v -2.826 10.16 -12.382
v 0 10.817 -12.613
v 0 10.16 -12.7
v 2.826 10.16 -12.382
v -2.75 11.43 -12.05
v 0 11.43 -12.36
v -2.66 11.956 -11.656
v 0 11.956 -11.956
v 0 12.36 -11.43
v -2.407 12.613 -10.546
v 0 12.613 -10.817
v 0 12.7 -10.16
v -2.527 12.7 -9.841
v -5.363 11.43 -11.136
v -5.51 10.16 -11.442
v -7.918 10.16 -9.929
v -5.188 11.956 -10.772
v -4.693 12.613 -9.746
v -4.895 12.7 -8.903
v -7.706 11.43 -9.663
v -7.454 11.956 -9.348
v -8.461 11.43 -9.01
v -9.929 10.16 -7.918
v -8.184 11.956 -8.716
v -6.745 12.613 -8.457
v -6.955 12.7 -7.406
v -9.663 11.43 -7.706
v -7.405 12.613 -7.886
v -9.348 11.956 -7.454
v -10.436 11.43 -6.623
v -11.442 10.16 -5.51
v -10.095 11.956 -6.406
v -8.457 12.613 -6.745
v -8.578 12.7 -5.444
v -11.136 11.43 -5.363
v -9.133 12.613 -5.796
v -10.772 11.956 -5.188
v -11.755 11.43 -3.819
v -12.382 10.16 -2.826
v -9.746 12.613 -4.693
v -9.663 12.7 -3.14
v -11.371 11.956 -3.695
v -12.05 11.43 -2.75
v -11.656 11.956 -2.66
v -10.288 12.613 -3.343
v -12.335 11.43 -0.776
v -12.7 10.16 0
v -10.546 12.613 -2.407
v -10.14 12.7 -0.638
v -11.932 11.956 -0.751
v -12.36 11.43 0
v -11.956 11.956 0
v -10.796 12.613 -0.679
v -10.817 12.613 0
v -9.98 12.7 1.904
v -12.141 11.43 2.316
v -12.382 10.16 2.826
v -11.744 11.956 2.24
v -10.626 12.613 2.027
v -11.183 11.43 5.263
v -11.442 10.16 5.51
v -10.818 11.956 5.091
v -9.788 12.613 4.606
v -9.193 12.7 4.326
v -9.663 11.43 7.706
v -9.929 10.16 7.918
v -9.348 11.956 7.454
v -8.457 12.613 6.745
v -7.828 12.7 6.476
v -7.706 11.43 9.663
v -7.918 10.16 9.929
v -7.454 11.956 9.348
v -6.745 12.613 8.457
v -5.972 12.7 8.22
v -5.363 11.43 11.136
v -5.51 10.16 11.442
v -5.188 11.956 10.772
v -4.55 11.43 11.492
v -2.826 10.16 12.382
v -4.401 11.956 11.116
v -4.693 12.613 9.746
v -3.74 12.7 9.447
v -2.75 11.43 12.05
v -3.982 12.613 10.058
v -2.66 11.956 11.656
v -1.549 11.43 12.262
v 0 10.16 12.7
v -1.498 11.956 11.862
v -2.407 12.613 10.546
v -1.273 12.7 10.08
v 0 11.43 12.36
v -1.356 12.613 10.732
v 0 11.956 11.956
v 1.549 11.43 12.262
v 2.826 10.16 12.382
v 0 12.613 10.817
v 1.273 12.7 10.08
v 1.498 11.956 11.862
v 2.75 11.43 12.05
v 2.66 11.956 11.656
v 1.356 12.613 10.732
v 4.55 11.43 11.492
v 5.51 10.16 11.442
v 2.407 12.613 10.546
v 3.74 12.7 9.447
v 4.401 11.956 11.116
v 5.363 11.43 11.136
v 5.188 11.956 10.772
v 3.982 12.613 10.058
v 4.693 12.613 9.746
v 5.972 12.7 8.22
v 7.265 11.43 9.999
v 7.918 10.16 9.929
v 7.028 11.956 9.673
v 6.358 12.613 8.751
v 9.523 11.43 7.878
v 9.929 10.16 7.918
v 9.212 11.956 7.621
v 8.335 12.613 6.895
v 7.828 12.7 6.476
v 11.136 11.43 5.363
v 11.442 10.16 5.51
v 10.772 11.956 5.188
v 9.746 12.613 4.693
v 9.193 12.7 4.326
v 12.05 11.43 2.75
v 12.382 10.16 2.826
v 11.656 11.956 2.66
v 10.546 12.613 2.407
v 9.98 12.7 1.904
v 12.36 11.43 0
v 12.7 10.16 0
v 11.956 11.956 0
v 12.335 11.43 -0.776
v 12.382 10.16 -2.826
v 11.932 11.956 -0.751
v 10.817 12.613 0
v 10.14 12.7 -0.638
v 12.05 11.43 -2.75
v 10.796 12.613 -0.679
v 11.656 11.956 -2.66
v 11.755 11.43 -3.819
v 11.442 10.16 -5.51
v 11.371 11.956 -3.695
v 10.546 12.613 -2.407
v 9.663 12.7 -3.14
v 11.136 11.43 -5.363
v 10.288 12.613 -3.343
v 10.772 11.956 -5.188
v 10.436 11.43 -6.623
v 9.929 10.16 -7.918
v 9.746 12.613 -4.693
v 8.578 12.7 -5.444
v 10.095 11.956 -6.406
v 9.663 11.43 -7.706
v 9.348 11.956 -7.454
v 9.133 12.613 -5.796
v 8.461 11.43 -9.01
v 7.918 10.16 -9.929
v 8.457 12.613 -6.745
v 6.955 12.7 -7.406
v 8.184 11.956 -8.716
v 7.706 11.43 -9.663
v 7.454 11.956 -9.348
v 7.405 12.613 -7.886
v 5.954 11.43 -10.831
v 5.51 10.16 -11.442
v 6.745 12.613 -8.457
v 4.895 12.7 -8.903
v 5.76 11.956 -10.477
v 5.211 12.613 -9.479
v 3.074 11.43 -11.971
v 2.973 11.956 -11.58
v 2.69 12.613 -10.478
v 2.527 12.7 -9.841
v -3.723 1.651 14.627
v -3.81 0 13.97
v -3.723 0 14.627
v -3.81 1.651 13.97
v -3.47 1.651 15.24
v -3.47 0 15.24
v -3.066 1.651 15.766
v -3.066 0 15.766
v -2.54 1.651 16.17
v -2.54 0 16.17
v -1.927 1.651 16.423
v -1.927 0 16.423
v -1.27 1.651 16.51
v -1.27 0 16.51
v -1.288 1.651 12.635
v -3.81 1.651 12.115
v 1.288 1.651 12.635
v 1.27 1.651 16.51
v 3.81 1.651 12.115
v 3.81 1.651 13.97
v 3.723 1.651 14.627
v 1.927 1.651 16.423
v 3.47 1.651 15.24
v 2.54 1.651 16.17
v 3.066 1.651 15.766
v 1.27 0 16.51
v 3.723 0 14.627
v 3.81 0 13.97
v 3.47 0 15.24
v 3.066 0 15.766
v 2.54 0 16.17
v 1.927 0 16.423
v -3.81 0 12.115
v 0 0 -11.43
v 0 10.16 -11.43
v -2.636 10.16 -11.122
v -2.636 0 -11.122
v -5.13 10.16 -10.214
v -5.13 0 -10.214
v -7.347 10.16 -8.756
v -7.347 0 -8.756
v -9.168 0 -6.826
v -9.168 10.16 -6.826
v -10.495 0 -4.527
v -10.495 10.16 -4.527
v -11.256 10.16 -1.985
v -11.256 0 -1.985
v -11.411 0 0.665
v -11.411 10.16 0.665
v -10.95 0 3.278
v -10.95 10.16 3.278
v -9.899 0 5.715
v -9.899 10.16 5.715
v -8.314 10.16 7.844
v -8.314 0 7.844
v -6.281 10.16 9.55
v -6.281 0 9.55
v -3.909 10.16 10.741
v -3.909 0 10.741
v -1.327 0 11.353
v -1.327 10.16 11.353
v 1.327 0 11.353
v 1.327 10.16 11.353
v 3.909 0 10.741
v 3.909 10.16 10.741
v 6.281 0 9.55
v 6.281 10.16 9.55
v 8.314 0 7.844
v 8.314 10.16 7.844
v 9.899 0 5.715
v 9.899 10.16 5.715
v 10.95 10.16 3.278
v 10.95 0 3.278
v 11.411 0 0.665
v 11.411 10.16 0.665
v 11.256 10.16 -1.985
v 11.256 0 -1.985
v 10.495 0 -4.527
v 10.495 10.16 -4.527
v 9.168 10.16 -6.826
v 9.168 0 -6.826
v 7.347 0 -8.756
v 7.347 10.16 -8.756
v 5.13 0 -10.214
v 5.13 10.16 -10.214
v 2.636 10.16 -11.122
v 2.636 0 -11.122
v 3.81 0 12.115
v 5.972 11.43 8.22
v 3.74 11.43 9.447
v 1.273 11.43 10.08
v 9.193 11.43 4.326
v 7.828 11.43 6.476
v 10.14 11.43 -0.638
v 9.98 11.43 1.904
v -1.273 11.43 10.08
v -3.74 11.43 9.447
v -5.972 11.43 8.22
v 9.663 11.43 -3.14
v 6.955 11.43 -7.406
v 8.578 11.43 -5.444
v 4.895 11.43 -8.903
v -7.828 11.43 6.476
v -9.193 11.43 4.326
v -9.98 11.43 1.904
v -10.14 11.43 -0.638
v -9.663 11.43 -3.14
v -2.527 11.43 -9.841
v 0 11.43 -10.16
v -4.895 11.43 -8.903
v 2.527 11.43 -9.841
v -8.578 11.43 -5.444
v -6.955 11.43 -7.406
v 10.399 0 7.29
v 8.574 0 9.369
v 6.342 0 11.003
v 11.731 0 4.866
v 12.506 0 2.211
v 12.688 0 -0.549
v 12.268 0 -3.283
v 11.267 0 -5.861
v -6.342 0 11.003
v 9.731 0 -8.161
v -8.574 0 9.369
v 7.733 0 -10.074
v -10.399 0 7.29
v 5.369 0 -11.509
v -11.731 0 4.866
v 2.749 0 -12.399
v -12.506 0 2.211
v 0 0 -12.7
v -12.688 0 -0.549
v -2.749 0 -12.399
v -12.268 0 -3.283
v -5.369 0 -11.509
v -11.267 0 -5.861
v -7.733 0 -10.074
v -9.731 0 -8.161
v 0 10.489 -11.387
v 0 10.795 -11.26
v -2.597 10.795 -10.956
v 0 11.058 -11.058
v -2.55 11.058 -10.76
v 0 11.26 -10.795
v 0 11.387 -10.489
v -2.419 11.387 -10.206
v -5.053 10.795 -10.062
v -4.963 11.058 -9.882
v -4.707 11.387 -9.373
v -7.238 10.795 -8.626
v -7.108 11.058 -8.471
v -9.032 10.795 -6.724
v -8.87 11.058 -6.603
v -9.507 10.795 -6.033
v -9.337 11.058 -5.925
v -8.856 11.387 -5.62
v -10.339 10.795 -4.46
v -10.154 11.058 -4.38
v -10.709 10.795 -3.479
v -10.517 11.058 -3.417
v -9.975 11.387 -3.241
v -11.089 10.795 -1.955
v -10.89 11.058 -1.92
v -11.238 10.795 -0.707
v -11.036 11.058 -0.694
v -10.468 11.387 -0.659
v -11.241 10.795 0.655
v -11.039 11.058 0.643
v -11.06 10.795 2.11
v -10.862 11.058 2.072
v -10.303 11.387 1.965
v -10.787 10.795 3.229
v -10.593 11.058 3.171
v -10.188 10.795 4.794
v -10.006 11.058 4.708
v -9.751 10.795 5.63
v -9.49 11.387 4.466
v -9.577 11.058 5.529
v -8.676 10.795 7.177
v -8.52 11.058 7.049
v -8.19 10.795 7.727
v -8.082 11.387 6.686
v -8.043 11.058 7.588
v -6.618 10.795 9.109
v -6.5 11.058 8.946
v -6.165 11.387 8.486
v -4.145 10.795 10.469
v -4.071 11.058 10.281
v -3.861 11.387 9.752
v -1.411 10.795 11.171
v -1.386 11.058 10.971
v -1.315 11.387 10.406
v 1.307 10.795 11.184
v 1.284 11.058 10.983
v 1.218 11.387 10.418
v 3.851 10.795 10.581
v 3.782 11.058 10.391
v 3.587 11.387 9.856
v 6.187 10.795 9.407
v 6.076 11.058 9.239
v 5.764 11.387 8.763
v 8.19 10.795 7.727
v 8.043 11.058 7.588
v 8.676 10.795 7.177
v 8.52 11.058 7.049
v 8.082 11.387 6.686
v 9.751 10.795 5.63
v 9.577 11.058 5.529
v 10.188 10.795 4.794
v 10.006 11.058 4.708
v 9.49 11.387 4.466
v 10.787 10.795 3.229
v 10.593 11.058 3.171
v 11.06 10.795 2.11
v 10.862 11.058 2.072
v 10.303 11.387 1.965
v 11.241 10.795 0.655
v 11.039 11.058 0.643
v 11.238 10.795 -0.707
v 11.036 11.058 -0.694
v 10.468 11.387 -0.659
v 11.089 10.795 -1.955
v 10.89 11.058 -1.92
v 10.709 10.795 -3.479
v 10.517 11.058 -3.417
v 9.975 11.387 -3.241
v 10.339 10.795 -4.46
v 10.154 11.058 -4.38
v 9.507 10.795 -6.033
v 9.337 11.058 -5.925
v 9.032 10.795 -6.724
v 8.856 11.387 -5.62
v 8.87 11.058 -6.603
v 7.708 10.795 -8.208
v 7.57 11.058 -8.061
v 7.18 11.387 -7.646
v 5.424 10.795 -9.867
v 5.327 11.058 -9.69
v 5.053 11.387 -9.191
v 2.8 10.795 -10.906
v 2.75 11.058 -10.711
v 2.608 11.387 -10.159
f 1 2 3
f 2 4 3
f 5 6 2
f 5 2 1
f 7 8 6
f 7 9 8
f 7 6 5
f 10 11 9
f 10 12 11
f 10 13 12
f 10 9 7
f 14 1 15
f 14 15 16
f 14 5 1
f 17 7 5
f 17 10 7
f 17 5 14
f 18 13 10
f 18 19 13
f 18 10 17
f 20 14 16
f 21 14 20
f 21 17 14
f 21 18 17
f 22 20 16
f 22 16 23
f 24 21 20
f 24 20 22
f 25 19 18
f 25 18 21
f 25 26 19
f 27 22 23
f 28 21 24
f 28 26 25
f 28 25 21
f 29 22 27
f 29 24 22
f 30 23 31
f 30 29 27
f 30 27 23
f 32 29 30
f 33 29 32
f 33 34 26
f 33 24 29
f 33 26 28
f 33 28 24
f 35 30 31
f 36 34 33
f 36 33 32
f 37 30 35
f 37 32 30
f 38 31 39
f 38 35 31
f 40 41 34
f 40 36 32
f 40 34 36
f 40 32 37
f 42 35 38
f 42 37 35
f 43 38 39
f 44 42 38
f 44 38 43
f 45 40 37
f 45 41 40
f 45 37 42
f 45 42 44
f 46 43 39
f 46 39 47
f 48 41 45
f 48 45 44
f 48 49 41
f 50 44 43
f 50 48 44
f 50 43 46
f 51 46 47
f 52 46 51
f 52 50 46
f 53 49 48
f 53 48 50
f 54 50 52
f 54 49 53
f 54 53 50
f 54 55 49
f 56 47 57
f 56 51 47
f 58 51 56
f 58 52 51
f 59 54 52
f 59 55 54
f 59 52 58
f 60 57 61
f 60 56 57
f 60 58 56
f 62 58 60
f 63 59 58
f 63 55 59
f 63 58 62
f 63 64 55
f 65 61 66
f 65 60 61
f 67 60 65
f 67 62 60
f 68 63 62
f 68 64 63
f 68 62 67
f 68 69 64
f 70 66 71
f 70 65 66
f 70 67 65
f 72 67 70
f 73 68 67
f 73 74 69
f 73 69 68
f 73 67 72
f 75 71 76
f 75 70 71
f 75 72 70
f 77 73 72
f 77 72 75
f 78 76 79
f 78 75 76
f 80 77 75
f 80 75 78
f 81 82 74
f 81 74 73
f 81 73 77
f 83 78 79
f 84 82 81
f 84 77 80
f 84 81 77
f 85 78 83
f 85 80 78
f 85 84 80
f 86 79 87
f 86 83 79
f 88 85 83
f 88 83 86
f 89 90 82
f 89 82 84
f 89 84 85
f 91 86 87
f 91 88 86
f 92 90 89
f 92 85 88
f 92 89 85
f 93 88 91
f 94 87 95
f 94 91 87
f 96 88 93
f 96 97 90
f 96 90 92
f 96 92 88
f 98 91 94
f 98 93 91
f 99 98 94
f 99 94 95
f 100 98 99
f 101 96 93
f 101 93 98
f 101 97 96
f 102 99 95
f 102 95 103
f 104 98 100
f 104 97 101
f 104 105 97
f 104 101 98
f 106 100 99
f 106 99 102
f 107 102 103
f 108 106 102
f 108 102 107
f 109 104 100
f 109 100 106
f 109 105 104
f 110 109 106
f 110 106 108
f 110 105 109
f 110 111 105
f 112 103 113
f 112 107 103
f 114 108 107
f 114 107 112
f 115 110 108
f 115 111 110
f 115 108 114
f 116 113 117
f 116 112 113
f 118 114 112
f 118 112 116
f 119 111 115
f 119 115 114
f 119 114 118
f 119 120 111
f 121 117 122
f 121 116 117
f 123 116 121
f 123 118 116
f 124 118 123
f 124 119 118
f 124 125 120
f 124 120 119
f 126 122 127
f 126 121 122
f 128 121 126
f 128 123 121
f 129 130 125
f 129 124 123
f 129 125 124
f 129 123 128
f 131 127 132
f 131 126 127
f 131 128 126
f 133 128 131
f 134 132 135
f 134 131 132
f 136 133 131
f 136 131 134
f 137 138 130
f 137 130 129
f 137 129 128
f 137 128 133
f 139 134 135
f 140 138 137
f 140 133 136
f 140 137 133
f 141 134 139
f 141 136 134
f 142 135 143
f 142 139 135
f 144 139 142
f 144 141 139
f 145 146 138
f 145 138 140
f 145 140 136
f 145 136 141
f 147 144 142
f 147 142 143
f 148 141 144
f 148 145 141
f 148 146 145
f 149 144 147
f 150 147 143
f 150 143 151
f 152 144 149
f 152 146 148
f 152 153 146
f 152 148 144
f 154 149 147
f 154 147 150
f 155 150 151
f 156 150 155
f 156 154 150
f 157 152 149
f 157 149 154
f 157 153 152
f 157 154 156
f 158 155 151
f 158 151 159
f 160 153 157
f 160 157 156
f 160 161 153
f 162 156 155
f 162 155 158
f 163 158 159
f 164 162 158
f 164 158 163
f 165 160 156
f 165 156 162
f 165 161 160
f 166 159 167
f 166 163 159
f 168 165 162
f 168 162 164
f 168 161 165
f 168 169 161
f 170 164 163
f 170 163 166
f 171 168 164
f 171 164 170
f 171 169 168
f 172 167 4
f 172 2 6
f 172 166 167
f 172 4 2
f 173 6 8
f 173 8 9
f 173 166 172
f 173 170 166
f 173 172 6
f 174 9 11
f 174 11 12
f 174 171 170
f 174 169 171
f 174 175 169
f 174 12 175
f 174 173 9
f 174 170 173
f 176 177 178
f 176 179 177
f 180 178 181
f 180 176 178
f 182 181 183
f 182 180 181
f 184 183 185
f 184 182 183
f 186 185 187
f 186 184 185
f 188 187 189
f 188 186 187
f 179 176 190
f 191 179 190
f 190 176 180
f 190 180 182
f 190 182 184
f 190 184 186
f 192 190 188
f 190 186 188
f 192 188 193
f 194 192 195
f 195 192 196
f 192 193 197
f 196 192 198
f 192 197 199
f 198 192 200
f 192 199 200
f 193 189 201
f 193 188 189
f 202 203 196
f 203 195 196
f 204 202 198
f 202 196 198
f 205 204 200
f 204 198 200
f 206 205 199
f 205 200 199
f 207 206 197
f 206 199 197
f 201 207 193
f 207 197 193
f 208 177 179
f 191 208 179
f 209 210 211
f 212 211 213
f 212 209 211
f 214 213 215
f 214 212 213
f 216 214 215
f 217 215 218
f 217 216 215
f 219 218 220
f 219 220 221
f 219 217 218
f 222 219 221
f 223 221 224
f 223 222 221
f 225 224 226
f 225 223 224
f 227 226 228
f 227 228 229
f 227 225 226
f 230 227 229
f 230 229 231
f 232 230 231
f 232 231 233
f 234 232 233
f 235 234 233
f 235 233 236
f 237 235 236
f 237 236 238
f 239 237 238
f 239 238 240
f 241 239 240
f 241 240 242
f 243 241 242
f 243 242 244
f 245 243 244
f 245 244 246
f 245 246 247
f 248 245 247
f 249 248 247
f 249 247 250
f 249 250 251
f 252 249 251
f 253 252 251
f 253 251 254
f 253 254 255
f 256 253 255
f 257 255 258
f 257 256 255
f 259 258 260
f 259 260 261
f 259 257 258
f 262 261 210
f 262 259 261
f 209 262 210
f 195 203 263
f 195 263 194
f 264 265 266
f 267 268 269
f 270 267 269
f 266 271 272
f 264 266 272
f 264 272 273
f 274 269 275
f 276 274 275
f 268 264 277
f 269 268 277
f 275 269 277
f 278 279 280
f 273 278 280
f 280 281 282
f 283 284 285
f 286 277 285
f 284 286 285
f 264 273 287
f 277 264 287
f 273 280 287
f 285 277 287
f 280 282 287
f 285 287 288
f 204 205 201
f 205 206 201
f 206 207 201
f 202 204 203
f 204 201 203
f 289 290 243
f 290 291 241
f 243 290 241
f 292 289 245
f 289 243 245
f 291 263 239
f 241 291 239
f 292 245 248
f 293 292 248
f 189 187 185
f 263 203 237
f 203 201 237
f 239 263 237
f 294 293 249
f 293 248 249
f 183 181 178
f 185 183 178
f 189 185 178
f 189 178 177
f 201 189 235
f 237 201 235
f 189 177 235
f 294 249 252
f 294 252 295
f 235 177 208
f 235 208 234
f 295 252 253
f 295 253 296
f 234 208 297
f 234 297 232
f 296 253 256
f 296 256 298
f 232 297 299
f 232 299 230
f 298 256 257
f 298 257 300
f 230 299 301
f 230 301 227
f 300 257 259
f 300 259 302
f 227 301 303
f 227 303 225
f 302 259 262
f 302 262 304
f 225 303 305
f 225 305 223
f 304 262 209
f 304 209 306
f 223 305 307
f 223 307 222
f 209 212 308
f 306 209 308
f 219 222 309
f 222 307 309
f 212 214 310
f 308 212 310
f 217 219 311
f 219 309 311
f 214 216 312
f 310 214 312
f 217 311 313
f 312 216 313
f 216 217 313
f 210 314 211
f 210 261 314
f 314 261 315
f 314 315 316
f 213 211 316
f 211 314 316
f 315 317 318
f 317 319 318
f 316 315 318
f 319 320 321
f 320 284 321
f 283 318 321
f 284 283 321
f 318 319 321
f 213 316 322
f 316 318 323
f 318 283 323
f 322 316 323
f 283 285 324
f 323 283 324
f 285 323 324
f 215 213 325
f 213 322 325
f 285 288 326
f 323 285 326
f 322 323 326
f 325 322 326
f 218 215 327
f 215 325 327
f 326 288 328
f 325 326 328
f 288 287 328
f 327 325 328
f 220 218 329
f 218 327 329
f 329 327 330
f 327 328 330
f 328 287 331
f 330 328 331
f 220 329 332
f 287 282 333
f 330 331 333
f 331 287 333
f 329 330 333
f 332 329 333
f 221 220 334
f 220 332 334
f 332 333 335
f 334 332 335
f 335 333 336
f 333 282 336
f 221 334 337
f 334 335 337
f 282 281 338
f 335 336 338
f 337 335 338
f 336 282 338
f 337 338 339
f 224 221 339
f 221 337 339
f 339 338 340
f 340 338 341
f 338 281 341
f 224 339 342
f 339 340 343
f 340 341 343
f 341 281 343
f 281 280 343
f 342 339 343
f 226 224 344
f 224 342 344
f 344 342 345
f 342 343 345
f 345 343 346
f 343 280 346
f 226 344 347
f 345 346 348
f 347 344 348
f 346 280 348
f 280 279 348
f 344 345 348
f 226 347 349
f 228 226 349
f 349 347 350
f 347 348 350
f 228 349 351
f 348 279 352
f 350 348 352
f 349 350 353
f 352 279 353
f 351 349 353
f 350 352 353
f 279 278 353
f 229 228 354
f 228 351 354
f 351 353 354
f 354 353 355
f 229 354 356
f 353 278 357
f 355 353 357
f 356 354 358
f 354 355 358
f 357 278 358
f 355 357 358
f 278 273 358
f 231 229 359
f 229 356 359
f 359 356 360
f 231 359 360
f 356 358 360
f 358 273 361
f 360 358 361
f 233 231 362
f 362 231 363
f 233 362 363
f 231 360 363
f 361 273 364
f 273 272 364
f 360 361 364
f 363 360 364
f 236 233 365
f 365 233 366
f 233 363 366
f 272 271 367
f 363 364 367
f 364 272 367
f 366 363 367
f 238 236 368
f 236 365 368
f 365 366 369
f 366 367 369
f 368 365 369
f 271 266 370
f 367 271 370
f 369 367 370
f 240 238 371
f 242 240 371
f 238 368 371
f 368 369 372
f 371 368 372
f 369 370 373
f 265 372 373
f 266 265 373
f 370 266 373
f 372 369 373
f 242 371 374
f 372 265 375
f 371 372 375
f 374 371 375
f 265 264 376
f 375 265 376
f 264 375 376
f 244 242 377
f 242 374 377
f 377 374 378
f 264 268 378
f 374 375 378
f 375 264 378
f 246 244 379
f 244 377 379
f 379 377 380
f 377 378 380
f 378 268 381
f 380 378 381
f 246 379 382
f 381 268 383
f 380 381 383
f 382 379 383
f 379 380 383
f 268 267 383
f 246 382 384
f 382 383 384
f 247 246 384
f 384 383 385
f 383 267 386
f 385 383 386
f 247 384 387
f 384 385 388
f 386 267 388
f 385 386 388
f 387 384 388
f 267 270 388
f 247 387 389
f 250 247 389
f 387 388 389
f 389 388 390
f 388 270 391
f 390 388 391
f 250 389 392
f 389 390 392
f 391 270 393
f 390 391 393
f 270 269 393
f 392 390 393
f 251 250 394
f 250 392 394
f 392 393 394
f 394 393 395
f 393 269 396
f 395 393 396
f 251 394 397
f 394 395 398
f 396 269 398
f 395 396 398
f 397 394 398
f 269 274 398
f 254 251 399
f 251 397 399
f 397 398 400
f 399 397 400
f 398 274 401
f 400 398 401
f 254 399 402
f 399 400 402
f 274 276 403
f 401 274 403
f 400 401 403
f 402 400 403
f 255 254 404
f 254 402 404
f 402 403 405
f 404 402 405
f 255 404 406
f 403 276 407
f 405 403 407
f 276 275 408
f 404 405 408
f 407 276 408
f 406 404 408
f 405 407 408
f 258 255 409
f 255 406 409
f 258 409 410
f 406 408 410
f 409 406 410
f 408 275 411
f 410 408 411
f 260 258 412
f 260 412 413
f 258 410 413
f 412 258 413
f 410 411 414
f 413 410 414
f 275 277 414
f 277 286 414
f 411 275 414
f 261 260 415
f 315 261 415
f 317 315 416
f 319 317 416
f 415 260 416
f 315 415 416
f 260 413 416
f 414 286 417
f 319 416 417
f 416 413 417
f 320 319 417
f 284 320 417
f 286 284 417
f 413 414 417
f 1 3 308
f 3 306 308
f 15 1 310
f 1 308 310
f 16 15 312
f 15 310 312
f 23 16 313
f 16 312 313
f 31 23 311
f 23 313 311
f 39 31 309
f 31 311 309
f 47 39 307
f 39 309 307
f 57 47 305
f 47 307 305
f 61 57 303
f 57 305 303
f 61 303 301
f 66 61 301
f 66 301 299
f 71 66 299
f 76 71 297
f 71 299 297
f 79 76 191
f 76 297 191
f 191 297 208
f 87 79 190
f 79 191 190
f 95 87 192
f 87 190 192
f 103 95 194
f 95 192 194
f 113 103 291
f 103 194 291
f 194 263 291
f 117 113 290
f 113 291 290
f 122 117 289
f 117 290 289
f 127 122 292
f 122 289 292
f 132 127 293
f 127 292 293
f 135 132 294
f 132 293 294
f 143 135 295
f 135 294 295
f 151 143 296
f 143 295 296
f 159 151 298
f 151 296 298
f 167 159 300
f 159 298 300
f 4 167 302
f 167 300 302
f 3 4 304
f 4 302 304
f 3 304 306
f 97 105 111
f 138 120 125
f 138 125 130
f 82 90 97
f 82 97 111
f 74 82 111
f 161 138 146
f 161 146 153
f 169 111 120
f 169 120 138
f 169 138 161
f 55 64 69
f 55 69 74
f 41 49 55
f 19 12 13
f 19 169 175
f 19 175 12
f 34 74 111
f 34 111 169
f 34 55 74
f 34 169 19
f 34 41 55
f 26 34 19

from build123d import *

# Parameters (mm, degrees)
SKETCH1_R                = 12.7
BOSS_EXTRUDE1_DEPTH      = 12.7
FILLET1_R                = 2.54
SHELL1_T                 = -1.27
BOSS_EXTRUDE2_REACH      = 36.29
BOSS_EXTRUDE2_END_RADIUS = 12.7
SKETCH4_W                = 7.62
SKETCH4_H                = 1.651
FILLET2_R                = 2.54


with BuildPart() as part:
    # Sketch1 → Boss-Extrude1 (new body)
    with BuildSketch(Plane(origin=(0, 0, 0), x_dir=(1, 0, 0), z_dir=(0, 1, 0))):
        with Locations(Location((0, 0, 0), (0, 0, 90))):
            Circle(SKETCH1_R)
    extrude(amount=BOSS_EXTRUDE1_DEPTH)

    # Fillet1
    fillet1_edges = [part.edges().sort_by_distance(p)[0] for p in [
        (0, 12.7, 12.7),
    ]]
    fillet(fillet1_edges, radius=FILLET1_R)

    # Shell1
    shell1_openings = [part.faces().sort_by_distance(p)[0] for p in [
        (0, 0, 0),
    ]]
    offset(amount=SHELL1_T, openings=shell1_openings, kind=Kind.INTERSECTION)

    # Boss-Extrude2: up to this cylinder (the profile starts outside it)
    boss_extrude2_end = Plane(origin=(0, 0.8255, 0), z_dir=(0, -1, 0)) * Cylinder(BOSS_EXTRUDE2_END_RADIUS, 98.98, mode=Mode.PRIVATE)
    # Sketch4 → Boss-Extrude2 (add, up to the surface)
    with BuildSketch(Plane.XY.offset(16.51), mode=Mode.PRIVATE) as boss_extrude2_sk1:
        with Locations((0, 0.8255)):
            Rectangle(SKETCH4_W, SKETCH4_H)
    boss_extrude2_tool1 = extrude(boss_extrude2_sk1.sketch, amount=-BOSS_EXTRUDE2_REACH, mode=Mode.PRIVATE) - boss_extrude2_end
    add(boss_extrude2_tool1.solids().sort_by_distance((0, 0.8255, 16.51))[0])

    # Fillet2
    fillet2_edges = [part.edges().sort_by_distance(p)[0] for p in [
        (-3.81, 0.8255, 16.51),
        (3.81, 0.8255, 16.51),
    ]]
    fillet(fillet2_edges, radius=FILLET2_R)


solid = part.part
